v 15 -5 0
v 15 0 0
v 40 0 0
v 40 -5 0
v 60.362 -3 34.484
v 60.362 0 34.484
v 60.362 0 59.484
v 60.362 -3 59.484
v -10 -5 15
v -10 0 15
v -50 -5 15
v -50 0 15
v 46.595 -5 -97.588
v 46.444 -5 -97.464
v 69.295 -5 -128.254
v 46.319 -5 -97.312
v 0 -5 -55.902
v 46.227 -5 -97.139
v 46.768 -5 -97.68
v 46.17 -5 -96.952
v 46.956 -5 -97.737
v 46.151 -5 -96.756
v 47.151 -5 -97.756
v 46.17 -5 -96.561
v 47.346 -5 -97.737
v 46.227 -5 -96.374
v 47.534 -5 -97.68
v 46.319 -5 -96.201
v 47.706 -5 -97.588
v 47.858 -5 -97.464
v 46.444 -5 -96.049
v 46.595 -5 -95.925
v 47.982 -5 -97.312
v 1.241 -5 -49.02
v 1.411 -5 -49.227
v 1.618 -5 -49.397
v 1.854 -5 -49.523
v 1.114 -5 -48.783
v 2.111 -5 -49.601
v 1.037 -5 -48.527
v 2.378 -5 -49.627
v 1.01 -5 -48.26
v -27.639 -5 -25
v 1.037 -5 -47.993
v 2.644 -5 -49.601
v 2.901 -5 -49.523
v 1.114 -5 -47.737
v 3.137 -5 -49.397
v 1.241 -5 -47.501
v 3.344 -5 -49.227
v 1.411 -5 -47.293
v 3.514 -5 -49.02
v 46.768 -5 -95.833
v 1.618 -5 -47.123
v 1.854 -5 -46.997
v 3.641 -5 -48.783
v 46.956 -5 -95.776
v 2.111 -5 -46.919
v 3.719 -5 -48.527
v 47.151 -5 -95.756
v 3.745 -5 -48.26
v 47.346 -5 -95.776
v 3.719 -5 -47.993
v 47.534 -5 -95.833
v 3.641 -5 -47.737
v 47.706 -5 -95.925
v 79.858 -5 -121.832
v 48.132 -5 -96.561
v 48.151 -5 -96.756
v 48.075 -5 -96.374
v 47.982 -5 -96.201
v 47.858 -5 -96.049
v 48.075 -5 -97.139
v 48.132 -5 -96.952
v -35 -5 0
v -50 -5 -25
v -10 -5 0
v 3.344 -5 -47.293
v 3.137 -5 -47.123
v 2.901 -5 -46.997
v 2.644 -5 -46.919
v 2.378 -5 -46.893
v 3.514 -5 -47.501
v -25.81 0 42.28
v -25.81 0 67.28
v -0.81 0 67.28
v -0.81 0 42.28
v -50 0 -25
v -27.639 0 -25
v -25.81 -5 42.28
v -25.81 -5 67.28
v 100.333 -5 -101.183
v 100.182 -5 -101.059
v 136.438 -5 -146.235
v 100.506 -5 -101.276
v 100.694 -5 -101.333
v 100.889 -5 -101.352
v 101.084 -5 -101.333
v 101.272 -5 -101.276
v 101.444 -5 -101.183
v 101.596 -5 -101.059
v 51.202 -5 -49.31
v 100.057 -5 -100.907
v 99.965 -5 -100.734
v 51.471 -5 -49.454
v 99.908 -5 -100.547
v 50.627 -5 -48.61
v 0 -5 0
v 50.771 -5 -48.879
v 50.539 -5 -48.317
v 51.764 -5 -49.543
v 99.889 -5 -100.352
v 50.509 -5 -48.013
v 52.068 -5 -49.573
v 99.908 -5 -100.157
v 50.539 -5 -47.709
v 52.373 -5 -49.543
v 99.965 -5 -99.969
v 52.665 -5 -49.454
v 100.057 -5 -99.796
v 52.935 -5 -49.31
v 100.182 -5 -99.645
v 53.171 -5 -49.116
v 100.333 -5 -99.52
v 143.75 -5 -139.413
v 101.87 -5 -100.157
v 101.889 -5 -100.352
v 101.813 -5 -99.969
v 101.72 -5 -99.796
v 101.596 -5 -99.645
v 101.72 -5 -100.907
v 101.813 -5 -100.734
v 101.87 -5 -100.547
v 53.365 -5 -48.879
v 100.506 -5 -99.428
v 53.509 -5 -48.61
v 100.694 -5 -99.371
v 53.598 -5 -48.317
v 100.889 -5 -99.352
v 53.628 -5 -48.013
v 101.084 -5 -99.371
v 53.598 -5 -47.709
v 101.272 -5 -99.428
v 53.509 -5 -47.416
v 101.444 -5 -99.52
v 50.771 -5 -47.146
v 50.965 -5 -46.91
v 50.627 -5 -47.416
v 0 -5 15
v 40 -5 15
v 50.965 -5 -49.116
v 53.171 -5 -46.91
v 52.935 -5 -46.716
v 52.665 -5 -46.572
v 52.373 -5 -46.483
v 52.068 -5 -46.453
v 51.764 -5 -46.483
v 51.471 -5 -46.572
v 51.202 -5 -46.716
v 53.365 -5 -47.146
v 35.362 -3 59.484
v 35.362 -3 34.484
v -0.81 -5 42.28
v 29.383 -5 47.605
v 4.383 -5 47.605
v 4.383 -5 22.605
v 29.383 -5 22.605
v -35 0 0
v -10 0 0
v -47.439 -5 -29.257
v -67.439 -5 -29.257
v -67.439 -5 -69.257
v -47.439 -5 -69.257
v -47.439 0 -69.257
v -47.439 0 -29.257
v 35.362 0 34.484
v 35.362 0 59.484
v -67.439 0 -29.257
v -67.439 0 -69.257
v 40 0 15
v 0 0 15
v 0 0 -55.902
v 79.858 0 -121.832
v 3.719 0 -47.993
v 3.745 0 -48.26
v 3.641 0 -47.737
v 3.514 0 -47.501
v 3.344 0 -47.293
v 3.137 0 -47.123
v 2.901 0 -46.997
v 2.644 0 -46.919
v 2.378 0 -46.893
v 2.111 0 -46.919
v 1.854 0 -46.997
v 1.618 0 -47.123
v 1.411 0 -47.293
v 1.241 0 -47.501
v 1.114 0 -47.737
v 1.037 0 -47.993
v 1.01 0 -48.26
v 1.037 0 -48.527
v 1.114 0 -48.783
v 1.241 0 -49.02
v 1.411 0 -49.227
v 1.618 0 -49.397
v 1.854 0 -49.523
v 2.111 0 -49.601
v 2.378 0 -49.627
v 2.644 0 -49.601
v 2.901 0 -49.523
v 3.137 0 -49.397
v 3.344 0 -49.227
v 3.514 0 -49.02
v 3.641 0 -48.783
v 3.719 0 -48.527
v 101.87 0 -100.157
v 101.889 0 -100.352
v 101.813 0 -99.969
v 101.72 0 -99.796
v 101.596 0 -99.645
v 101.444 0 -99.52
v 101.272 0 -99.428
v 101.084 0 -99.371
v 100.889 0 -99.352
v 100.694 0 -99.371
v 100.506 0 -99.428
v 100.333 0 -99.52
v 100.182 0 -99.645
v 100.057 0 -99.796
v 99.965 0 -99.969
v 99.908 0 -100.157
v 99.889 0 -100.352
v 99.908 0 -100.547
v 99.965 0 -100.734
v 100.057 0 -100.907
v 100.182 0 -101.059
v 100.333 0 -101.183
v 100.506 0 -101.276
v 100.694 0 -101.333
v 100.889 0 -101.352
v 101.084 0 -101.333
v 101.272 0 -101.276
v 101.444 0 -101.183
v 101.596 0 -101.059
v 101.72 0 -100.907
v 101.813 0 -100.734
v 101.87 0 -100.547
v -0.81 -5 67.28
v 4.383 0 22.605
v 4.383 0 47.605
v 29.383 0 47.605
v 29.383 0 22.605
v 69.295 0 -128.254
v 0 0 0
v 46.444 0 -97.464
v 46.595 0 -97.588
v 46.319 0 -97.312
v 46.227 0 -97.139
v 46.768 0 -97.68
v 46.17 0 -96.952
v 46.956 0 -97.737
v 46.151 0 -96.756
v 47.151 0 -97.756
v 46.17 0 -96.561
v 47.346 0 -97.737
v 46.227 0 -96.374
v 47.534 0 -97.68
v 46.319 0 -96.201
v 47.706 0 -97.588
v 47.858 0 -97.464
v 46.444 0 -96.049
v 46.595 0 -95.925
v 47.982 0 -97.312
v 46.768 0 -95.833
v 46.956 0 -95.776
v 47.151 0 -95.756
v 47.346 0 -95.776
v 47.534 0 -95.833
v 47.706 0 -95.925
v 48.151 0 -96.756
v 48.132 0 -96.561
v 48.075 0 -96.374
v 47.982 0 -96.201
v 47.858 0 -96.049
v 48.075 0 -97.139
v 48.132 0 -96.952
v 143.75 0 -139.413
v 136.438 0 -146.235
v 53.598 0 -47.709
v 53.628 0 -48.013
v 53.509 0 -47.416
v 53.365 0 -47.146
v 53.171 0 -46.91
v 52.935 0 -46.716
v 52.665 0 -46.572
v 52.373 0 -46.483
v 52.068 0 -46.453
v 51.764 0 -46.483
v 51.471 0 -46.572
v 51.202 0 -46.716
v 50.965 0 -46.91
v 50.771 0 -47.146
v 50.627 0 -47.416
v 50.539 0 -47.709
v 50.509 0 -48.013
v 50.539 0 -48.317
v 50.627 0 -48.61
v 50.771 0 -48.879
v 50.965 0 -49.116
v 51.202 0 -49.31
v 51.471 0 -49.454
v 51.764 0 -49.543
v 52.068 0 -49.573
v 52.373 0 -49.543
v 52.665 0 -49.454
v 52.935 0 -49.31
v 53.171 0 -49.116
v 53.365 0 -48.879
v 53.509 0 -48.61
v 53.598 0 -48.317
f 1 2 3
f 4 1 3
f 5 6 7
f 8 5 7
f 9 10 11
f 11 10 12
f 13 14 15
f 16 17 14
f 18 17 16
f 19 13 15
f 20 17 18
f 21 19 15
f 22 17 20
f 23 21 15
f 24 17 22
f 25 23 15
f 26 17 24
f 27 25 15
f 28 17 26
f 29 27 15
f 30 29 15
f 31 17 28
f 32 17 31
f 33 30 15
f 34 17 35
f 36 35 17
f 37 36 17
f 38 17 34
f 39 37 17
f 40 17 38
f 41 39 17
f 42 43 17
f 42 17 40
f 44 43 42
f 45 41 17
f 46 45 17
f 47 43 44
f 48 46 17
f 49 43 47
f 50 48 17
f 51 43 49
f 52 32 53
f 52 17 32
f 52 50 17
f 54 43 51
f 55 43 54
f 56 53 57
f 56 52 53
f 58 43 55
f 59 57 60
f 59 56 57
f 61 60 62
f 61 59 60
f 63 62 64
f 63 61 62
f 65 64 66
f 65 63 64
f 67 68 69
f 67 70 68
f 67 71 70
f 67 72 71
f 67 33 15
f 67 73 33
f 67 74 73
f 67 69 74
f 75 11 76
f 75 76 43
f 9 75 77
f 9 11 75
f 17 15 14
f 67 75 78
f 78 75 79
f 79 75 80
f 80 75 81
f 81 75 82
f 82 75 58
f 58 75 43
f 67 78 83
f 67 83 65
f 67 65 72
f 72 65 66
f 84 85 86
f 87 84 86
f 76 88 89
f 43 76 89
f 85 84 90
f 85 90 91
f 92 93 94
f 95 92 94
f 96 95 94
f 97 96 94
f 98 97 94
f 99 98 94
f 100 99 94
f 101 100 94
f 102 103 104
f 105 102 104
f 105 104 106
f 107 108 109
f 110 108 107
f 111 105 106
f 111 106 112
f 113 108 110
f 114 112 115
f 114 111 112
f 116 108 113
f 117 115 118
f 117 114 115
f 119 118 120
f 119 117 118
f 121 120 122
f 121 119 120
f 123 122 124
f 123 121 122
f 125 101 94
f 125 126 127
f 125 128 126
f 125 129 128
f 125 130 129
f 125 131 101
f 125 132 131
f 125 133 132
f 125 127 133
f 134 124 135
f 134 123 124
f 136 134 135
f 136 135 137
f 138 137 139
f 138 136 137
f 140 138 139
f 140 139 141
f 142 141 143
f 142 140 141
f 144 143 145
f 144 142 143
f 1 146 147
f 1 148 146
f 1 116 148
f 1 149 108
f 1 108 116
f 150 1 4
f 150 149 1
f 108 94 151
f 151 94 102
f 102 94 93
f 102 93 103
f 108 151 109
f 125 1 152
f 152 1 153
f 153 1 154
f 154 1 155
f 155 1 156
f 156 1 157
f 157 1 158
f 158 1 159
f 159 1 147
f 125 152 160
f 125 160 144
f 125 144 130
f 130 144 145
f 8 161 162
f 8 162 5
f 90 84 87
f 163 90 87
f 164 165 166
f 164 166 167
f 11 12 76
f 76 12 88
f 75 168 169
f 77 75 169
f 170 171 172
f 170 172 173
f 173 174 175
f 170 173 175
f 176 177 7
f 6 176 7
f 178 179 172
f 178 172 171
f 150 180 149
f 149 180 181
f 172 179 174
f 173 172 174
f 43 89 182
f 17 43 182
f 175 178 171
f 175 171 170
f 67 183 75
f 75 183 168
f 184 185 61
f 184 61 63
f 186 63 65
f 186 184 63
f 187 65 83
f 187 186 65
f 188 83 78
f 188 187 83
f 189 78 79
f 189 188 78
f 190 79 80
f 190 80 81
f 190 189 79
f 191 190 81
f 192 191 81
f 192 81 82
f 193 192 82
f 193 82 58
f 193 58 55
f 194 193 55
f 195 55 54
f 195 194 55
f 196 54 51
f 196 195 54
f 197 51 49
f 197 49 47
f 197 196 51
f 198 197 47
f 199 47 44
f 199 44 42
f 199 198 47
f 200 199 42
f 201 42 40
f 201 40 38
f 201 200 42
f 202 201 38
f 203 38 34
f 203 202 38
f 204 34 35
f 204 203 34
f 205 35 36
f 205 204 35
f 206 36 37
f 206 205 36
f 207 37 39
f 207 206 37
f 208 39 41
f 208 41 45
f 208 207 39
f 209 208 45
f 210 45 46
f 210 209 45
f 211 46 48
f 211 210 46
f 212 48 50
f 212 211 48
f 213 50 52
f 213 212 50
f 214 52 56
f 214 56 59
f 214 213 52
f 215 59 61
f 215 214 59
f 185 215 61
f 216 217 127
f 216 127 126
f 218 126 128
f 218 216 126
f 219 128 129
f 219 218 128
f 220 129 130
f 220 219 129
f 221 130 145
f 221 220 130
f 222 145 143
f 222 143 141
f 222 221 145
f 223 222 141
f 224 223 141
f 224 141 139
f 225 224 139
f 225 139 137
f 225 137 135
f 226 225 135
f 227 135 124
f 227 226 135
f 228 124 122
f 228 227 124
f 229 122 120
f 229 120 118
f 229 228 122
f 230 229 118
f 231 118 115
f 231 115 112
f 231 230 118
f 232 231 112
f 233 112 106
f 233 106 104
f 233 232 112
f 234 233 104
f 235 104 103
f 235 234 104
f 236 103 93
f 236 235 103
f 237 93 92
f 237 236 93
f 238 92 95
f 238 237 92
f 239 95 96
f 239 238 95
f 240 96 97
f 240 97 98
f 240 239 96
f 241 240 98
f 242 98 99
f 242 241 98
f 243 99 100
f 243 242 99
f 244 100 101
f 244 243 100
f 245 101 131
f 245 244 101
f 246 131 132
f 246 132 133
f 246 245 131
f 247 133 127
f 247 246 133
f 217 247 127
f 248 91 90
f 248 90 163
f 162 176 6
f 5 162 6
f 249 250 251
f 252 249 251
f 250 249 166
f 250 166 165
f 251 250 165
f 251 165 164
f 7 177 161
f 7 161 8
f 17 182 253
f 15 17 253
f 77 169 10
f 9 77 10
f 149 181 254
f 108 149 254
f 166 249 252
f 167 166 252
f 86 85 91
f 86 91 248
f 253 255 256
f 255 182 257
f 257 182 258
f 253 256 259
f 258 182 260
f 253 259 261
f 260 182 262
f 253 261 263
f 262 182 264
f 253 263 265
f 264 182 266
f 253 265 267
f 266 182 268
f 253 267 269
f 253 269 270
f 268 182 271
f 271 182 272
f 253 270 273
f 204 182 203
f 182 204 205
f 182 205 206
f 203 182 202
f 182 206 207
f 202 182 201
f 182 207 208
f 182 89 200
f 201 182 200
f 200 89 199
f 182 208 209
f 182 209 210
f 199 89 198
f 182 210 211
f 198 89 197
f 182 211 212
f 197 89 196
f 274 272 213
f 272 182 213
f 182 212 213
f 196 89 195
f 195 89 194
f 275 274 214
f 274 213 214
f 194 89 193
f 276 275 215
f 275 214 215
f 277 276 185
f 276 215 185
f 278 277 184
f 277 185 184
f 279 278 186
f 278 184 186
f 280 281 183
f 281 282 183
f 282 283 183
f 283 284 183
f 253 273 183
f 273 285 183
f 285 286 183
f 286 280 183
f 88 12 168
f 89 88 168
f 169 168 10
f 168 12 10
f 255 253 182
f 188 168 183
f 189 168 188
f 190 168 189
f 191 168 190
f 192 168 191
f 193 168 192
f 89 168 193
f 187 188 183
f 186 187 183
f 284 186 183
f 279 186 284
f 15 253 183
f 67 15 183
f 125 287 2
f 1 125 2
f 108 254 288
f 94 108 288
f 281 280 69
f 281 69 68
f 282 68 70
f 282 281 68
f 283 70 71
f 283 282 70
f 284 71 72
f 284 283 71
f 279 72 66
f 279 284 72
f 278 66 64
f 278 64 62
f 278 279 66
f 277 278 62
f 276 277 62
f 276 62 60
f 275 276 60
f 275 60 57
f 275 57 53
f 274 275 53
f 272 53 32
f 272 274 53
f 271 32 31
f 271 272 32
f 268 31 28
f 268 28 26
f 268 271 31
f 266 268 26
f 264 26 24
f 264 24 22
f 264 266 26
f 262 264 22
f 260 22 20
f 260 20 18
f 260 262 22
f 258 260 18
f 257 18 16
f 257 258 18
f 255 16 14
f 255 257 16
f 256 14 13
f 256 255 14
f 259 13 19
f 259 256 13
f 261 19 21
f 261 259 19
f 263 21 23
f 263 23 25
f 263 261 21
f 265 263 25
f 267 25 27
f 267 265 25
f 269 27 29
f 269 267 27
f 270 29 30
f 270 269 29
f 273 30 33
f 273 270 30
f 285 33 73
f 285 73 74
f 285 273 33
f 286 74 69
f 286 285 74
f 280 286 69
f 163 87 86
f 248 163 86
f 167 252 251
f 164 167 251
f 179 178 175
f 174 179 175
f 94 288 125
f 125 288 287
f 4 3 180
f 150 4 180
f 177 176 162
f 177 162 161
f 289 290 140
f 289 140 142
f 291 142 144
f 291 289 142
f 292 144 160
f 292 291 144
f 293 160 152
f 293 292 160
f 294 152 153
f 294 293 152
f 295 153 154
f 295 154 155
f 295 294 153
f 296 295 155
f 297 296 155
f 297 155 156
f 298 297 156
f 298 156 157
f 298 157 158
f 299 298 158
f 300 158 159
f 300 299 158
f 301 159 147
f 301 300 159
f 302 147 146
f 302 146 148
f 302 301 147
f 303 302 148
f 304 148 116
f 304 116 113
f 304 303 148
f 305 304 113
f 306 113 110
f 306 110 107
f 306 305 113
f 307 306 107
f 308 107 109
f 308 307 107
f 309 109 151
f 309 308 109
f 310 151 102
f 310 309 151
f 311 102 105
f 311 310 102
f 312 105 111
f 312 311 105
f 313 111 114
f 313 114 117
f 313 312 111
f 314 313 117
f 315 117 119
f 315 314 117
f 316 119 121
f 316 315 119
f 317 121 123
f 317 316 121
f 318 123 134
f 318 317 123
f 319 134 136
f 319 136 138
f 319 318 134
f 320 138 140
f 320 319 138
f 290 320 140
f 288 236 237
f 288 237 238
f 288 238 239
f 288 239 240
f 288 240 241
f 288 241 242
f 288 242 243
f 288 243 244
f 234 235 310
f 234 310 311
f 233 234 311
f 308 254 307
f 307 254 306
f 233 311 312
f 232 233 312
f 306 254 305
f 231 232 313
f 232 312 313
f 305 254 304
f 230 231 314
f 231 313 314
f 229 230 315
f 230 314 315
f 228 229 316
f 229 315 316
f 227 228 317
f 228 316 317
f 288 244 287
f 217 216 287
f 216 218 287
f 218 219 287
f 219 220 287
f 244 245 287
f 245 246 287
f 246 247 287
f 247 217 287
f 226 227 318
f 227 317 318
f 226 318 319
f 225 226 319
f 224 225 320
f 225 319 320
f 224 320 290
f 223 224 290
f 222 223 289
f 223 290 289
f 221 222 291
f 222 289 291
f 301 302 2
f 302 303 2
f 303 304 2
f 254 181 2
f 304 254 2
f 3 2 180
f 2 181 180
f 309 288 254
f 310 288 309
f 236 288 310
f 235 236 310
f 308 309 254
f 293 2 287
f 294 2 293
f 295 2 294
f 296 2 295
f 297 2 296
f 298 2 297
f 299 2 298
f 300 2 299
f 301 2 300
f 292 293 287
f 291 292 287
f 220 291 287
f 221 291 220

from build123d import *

# Parameters (mm, degrees)
F1_R      = 1
F1_R_2    = 1.367219
F2_DEPTH  = 5
F0_R      = 1
F0_R_2    = 1.559672
F3_DEPTH  = 5
F4_W      = 25
F4_H      = 25
F5_DEPTH  = 3
F6_W      = 25
F6_H      = 25
F7_DEPTH  = 5
F8_W      = 25
F8_H      = 25
F9_DEPTH  = 5
F10_W     = 20
F10_H     = 40
F11_DEPTH = 5


with BuildPart() as f2:
    # F1 (on Front) → F2 (new body)
    with BuildSketch(Plane.XZ):
        Polygon((-35, 0), (-10, 0), (-10, 15), (-50, 15), (-50, 0), (-27.63932, -25), (0, -55.901699), (69.295436, -128.253713), (79.858281, -121.831857), align=None)
        with Locations((47.150847, -96.756466)):
            Circle(F1_R, mode=Mode.SUBTRACT)
        with Locations((2.377605, -48.260119)):
            Circle(F1_R_2, mode=Mode.SUBTRACT)
        Polygon((-27.63932, -25), (-50, 0), (-50, -25), align=None)
    extrude(amount=F2_DEPTH)


with BuildPart() as f3:
    # F0 (on Front) → F3 (new body)
    with BuildSketch(Plane.XZ):
        Polygon((0, 15), (0, 0), (136.437785, -146.235191), (143.749544, -139.413301), (15, 0), (40, 0), (40, 15), align=None)
        with Locations((100.888878, -100.351766)):
            Circle(F0_R, mode=Mode.SUBTRACT)
        with Locations((52.068237, -48.012901)):
            Circle(F0_R_2, mode=Mode.SUBTRACT)
    extrude(amount=F3_DEPTH)


with BuildPart() as f5:
    # F4 (on Front) → F5 (new body)
    with BuildSketch(Plane.XZ):
        with Locations((47.862262, 46.984476)):
            Rectangle(F4_W, F4_H)
    extrude(amount=F5_DEPTH)


with BuildPart() as f7:
    # F6 (on Front) → F7 (new body)
    with BuildSketch(Plane.XZ):
        with Locations((-13.309981, 54.780201)):
            Rectangle(F6_W, F6_H)
    extrude(amount=F7_DEPTH)


with BuildPart() as f9:
    # F8 (on Front) → F9 (new body)
    with BuildSketch(Plane.XZ):
        with Locations((16.883476, 35.104544)):
            Rectangle(F8_W, F8_H)
    extrude(amount=F9_DEPTH)


with BuildPart() as f11:
    # F10 (on Front) → F11 (new body)
    with BuildSketch(Plane.XZ):
        with Locations((-57.439094, -49.257416)):
            Rectangle(F10_W, F10_H)
    extrude(amount=F11_DEPTH)


solid = Compound([f2.part, f3.part, f5.part, f7.part, f9.part, f11.part])
